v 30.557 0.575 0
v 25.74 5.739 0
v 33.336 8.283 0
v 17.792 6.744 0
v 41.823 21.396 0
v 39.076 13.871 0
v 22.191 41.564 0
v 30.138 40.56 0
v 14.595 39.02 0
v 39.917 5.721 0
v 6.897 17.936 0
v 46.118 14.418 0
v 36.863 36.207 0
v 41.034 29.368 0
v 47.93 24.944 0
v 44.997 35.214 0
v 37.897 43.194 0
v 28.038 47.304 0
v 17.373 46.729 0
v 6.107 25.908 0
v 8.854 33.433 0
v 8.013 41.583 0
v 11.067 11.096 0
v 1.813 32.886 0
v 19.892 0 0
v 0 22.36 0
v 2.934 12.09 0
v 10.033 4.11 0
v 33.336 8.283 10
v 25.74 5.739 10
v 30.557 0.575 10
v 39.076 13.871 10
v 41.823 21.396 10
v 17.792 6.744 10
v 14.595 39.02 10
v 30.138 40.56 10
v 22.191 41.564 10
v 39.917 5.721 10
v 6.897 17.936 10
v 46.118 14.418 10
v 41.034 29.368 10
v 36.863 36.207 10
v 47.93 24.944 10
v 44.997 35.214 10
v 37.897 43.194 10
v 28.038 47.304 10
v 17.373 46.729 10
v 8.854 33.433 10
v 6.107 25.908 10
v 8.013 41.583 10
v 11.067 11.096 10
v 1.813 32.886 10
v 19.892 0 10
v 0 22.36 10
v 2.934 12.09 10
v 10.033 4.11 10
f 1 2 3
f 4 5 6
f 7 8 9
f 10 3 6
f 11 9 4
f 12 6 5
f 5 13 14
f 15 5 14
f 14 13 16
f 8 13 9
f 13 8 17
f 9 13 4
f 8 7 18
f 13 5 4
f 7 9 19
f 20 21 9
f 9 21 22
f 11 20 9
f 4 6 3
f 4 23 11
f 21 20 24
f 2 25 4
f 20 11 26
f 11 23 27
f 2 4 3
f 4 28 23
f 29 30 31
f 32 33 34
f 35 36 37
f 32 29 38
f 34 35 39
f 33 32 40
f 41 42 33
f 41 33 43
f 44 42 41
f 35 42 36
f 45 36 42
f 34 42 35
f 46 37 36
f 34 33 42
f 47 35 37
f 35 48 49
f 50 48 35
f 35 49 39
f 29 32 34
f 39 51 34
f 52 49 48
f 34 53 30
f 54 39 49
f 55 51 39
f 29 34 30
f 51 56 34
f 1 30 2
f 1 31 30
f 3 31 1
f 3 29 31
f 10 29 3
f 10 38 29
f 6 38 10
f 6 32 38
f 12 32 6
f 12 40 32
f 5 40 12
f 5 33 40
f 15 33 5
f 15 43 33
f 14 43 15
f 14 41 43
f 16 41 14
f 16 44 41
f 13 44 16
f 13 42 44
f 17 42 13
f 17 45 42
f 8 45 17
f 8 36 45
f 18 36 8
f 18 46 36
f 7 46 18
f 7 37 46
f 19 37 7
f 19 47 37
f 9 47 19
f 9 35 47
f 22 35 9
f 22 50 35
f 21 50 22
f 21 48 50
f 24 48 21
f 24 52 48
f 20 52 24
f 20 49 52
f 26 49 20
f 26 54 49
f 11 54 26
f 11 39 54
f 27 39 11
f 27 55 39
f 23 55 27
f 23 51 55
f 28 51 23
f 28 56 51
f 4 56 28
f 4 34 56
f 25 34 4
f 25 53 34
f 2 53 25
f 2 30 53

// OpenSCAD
$fn = 32;

// ----------------------------------------------------------------------
// Chain sprocket: 14 teeth, 18 mm root radius
// ----------------------------------------------------------------------

// --- parameters (mm) ---
profile_height = 10;      // extrusion height
profile_points = 28;      // points of the closed outline

profile = [[41.823, 21.396], [47.93, 24.944], [41.034, 29.368], [44.997, 35.214], [36.863, 36.207], [37.897, 43.194], [30.138, 40.56], [28.038, 47.304], [22.191, 41.564], [17.373, 46.729], [14.595, 39.02], [8.013, 41.583], [8.854, 33.433], [1.813, 32.886], [6.107, 25.908], [0, 22.36], [6.897, 17.936], [2.934, 12.09], [11.067, 11.096], [10.033, 4.11], [17.792, 6.744], [19.892, 0], [25.74, 5.739], [30.557, 0.575], [33.336, 8.283], [39.917, 5.721], [39.076, 13.871], [46.118, 14.418]];  // single closed polygon, 28 points, counter clockwise

// --- the one profile operation ---
linear_extrude(height = profile_height) polygon(points = profile);
